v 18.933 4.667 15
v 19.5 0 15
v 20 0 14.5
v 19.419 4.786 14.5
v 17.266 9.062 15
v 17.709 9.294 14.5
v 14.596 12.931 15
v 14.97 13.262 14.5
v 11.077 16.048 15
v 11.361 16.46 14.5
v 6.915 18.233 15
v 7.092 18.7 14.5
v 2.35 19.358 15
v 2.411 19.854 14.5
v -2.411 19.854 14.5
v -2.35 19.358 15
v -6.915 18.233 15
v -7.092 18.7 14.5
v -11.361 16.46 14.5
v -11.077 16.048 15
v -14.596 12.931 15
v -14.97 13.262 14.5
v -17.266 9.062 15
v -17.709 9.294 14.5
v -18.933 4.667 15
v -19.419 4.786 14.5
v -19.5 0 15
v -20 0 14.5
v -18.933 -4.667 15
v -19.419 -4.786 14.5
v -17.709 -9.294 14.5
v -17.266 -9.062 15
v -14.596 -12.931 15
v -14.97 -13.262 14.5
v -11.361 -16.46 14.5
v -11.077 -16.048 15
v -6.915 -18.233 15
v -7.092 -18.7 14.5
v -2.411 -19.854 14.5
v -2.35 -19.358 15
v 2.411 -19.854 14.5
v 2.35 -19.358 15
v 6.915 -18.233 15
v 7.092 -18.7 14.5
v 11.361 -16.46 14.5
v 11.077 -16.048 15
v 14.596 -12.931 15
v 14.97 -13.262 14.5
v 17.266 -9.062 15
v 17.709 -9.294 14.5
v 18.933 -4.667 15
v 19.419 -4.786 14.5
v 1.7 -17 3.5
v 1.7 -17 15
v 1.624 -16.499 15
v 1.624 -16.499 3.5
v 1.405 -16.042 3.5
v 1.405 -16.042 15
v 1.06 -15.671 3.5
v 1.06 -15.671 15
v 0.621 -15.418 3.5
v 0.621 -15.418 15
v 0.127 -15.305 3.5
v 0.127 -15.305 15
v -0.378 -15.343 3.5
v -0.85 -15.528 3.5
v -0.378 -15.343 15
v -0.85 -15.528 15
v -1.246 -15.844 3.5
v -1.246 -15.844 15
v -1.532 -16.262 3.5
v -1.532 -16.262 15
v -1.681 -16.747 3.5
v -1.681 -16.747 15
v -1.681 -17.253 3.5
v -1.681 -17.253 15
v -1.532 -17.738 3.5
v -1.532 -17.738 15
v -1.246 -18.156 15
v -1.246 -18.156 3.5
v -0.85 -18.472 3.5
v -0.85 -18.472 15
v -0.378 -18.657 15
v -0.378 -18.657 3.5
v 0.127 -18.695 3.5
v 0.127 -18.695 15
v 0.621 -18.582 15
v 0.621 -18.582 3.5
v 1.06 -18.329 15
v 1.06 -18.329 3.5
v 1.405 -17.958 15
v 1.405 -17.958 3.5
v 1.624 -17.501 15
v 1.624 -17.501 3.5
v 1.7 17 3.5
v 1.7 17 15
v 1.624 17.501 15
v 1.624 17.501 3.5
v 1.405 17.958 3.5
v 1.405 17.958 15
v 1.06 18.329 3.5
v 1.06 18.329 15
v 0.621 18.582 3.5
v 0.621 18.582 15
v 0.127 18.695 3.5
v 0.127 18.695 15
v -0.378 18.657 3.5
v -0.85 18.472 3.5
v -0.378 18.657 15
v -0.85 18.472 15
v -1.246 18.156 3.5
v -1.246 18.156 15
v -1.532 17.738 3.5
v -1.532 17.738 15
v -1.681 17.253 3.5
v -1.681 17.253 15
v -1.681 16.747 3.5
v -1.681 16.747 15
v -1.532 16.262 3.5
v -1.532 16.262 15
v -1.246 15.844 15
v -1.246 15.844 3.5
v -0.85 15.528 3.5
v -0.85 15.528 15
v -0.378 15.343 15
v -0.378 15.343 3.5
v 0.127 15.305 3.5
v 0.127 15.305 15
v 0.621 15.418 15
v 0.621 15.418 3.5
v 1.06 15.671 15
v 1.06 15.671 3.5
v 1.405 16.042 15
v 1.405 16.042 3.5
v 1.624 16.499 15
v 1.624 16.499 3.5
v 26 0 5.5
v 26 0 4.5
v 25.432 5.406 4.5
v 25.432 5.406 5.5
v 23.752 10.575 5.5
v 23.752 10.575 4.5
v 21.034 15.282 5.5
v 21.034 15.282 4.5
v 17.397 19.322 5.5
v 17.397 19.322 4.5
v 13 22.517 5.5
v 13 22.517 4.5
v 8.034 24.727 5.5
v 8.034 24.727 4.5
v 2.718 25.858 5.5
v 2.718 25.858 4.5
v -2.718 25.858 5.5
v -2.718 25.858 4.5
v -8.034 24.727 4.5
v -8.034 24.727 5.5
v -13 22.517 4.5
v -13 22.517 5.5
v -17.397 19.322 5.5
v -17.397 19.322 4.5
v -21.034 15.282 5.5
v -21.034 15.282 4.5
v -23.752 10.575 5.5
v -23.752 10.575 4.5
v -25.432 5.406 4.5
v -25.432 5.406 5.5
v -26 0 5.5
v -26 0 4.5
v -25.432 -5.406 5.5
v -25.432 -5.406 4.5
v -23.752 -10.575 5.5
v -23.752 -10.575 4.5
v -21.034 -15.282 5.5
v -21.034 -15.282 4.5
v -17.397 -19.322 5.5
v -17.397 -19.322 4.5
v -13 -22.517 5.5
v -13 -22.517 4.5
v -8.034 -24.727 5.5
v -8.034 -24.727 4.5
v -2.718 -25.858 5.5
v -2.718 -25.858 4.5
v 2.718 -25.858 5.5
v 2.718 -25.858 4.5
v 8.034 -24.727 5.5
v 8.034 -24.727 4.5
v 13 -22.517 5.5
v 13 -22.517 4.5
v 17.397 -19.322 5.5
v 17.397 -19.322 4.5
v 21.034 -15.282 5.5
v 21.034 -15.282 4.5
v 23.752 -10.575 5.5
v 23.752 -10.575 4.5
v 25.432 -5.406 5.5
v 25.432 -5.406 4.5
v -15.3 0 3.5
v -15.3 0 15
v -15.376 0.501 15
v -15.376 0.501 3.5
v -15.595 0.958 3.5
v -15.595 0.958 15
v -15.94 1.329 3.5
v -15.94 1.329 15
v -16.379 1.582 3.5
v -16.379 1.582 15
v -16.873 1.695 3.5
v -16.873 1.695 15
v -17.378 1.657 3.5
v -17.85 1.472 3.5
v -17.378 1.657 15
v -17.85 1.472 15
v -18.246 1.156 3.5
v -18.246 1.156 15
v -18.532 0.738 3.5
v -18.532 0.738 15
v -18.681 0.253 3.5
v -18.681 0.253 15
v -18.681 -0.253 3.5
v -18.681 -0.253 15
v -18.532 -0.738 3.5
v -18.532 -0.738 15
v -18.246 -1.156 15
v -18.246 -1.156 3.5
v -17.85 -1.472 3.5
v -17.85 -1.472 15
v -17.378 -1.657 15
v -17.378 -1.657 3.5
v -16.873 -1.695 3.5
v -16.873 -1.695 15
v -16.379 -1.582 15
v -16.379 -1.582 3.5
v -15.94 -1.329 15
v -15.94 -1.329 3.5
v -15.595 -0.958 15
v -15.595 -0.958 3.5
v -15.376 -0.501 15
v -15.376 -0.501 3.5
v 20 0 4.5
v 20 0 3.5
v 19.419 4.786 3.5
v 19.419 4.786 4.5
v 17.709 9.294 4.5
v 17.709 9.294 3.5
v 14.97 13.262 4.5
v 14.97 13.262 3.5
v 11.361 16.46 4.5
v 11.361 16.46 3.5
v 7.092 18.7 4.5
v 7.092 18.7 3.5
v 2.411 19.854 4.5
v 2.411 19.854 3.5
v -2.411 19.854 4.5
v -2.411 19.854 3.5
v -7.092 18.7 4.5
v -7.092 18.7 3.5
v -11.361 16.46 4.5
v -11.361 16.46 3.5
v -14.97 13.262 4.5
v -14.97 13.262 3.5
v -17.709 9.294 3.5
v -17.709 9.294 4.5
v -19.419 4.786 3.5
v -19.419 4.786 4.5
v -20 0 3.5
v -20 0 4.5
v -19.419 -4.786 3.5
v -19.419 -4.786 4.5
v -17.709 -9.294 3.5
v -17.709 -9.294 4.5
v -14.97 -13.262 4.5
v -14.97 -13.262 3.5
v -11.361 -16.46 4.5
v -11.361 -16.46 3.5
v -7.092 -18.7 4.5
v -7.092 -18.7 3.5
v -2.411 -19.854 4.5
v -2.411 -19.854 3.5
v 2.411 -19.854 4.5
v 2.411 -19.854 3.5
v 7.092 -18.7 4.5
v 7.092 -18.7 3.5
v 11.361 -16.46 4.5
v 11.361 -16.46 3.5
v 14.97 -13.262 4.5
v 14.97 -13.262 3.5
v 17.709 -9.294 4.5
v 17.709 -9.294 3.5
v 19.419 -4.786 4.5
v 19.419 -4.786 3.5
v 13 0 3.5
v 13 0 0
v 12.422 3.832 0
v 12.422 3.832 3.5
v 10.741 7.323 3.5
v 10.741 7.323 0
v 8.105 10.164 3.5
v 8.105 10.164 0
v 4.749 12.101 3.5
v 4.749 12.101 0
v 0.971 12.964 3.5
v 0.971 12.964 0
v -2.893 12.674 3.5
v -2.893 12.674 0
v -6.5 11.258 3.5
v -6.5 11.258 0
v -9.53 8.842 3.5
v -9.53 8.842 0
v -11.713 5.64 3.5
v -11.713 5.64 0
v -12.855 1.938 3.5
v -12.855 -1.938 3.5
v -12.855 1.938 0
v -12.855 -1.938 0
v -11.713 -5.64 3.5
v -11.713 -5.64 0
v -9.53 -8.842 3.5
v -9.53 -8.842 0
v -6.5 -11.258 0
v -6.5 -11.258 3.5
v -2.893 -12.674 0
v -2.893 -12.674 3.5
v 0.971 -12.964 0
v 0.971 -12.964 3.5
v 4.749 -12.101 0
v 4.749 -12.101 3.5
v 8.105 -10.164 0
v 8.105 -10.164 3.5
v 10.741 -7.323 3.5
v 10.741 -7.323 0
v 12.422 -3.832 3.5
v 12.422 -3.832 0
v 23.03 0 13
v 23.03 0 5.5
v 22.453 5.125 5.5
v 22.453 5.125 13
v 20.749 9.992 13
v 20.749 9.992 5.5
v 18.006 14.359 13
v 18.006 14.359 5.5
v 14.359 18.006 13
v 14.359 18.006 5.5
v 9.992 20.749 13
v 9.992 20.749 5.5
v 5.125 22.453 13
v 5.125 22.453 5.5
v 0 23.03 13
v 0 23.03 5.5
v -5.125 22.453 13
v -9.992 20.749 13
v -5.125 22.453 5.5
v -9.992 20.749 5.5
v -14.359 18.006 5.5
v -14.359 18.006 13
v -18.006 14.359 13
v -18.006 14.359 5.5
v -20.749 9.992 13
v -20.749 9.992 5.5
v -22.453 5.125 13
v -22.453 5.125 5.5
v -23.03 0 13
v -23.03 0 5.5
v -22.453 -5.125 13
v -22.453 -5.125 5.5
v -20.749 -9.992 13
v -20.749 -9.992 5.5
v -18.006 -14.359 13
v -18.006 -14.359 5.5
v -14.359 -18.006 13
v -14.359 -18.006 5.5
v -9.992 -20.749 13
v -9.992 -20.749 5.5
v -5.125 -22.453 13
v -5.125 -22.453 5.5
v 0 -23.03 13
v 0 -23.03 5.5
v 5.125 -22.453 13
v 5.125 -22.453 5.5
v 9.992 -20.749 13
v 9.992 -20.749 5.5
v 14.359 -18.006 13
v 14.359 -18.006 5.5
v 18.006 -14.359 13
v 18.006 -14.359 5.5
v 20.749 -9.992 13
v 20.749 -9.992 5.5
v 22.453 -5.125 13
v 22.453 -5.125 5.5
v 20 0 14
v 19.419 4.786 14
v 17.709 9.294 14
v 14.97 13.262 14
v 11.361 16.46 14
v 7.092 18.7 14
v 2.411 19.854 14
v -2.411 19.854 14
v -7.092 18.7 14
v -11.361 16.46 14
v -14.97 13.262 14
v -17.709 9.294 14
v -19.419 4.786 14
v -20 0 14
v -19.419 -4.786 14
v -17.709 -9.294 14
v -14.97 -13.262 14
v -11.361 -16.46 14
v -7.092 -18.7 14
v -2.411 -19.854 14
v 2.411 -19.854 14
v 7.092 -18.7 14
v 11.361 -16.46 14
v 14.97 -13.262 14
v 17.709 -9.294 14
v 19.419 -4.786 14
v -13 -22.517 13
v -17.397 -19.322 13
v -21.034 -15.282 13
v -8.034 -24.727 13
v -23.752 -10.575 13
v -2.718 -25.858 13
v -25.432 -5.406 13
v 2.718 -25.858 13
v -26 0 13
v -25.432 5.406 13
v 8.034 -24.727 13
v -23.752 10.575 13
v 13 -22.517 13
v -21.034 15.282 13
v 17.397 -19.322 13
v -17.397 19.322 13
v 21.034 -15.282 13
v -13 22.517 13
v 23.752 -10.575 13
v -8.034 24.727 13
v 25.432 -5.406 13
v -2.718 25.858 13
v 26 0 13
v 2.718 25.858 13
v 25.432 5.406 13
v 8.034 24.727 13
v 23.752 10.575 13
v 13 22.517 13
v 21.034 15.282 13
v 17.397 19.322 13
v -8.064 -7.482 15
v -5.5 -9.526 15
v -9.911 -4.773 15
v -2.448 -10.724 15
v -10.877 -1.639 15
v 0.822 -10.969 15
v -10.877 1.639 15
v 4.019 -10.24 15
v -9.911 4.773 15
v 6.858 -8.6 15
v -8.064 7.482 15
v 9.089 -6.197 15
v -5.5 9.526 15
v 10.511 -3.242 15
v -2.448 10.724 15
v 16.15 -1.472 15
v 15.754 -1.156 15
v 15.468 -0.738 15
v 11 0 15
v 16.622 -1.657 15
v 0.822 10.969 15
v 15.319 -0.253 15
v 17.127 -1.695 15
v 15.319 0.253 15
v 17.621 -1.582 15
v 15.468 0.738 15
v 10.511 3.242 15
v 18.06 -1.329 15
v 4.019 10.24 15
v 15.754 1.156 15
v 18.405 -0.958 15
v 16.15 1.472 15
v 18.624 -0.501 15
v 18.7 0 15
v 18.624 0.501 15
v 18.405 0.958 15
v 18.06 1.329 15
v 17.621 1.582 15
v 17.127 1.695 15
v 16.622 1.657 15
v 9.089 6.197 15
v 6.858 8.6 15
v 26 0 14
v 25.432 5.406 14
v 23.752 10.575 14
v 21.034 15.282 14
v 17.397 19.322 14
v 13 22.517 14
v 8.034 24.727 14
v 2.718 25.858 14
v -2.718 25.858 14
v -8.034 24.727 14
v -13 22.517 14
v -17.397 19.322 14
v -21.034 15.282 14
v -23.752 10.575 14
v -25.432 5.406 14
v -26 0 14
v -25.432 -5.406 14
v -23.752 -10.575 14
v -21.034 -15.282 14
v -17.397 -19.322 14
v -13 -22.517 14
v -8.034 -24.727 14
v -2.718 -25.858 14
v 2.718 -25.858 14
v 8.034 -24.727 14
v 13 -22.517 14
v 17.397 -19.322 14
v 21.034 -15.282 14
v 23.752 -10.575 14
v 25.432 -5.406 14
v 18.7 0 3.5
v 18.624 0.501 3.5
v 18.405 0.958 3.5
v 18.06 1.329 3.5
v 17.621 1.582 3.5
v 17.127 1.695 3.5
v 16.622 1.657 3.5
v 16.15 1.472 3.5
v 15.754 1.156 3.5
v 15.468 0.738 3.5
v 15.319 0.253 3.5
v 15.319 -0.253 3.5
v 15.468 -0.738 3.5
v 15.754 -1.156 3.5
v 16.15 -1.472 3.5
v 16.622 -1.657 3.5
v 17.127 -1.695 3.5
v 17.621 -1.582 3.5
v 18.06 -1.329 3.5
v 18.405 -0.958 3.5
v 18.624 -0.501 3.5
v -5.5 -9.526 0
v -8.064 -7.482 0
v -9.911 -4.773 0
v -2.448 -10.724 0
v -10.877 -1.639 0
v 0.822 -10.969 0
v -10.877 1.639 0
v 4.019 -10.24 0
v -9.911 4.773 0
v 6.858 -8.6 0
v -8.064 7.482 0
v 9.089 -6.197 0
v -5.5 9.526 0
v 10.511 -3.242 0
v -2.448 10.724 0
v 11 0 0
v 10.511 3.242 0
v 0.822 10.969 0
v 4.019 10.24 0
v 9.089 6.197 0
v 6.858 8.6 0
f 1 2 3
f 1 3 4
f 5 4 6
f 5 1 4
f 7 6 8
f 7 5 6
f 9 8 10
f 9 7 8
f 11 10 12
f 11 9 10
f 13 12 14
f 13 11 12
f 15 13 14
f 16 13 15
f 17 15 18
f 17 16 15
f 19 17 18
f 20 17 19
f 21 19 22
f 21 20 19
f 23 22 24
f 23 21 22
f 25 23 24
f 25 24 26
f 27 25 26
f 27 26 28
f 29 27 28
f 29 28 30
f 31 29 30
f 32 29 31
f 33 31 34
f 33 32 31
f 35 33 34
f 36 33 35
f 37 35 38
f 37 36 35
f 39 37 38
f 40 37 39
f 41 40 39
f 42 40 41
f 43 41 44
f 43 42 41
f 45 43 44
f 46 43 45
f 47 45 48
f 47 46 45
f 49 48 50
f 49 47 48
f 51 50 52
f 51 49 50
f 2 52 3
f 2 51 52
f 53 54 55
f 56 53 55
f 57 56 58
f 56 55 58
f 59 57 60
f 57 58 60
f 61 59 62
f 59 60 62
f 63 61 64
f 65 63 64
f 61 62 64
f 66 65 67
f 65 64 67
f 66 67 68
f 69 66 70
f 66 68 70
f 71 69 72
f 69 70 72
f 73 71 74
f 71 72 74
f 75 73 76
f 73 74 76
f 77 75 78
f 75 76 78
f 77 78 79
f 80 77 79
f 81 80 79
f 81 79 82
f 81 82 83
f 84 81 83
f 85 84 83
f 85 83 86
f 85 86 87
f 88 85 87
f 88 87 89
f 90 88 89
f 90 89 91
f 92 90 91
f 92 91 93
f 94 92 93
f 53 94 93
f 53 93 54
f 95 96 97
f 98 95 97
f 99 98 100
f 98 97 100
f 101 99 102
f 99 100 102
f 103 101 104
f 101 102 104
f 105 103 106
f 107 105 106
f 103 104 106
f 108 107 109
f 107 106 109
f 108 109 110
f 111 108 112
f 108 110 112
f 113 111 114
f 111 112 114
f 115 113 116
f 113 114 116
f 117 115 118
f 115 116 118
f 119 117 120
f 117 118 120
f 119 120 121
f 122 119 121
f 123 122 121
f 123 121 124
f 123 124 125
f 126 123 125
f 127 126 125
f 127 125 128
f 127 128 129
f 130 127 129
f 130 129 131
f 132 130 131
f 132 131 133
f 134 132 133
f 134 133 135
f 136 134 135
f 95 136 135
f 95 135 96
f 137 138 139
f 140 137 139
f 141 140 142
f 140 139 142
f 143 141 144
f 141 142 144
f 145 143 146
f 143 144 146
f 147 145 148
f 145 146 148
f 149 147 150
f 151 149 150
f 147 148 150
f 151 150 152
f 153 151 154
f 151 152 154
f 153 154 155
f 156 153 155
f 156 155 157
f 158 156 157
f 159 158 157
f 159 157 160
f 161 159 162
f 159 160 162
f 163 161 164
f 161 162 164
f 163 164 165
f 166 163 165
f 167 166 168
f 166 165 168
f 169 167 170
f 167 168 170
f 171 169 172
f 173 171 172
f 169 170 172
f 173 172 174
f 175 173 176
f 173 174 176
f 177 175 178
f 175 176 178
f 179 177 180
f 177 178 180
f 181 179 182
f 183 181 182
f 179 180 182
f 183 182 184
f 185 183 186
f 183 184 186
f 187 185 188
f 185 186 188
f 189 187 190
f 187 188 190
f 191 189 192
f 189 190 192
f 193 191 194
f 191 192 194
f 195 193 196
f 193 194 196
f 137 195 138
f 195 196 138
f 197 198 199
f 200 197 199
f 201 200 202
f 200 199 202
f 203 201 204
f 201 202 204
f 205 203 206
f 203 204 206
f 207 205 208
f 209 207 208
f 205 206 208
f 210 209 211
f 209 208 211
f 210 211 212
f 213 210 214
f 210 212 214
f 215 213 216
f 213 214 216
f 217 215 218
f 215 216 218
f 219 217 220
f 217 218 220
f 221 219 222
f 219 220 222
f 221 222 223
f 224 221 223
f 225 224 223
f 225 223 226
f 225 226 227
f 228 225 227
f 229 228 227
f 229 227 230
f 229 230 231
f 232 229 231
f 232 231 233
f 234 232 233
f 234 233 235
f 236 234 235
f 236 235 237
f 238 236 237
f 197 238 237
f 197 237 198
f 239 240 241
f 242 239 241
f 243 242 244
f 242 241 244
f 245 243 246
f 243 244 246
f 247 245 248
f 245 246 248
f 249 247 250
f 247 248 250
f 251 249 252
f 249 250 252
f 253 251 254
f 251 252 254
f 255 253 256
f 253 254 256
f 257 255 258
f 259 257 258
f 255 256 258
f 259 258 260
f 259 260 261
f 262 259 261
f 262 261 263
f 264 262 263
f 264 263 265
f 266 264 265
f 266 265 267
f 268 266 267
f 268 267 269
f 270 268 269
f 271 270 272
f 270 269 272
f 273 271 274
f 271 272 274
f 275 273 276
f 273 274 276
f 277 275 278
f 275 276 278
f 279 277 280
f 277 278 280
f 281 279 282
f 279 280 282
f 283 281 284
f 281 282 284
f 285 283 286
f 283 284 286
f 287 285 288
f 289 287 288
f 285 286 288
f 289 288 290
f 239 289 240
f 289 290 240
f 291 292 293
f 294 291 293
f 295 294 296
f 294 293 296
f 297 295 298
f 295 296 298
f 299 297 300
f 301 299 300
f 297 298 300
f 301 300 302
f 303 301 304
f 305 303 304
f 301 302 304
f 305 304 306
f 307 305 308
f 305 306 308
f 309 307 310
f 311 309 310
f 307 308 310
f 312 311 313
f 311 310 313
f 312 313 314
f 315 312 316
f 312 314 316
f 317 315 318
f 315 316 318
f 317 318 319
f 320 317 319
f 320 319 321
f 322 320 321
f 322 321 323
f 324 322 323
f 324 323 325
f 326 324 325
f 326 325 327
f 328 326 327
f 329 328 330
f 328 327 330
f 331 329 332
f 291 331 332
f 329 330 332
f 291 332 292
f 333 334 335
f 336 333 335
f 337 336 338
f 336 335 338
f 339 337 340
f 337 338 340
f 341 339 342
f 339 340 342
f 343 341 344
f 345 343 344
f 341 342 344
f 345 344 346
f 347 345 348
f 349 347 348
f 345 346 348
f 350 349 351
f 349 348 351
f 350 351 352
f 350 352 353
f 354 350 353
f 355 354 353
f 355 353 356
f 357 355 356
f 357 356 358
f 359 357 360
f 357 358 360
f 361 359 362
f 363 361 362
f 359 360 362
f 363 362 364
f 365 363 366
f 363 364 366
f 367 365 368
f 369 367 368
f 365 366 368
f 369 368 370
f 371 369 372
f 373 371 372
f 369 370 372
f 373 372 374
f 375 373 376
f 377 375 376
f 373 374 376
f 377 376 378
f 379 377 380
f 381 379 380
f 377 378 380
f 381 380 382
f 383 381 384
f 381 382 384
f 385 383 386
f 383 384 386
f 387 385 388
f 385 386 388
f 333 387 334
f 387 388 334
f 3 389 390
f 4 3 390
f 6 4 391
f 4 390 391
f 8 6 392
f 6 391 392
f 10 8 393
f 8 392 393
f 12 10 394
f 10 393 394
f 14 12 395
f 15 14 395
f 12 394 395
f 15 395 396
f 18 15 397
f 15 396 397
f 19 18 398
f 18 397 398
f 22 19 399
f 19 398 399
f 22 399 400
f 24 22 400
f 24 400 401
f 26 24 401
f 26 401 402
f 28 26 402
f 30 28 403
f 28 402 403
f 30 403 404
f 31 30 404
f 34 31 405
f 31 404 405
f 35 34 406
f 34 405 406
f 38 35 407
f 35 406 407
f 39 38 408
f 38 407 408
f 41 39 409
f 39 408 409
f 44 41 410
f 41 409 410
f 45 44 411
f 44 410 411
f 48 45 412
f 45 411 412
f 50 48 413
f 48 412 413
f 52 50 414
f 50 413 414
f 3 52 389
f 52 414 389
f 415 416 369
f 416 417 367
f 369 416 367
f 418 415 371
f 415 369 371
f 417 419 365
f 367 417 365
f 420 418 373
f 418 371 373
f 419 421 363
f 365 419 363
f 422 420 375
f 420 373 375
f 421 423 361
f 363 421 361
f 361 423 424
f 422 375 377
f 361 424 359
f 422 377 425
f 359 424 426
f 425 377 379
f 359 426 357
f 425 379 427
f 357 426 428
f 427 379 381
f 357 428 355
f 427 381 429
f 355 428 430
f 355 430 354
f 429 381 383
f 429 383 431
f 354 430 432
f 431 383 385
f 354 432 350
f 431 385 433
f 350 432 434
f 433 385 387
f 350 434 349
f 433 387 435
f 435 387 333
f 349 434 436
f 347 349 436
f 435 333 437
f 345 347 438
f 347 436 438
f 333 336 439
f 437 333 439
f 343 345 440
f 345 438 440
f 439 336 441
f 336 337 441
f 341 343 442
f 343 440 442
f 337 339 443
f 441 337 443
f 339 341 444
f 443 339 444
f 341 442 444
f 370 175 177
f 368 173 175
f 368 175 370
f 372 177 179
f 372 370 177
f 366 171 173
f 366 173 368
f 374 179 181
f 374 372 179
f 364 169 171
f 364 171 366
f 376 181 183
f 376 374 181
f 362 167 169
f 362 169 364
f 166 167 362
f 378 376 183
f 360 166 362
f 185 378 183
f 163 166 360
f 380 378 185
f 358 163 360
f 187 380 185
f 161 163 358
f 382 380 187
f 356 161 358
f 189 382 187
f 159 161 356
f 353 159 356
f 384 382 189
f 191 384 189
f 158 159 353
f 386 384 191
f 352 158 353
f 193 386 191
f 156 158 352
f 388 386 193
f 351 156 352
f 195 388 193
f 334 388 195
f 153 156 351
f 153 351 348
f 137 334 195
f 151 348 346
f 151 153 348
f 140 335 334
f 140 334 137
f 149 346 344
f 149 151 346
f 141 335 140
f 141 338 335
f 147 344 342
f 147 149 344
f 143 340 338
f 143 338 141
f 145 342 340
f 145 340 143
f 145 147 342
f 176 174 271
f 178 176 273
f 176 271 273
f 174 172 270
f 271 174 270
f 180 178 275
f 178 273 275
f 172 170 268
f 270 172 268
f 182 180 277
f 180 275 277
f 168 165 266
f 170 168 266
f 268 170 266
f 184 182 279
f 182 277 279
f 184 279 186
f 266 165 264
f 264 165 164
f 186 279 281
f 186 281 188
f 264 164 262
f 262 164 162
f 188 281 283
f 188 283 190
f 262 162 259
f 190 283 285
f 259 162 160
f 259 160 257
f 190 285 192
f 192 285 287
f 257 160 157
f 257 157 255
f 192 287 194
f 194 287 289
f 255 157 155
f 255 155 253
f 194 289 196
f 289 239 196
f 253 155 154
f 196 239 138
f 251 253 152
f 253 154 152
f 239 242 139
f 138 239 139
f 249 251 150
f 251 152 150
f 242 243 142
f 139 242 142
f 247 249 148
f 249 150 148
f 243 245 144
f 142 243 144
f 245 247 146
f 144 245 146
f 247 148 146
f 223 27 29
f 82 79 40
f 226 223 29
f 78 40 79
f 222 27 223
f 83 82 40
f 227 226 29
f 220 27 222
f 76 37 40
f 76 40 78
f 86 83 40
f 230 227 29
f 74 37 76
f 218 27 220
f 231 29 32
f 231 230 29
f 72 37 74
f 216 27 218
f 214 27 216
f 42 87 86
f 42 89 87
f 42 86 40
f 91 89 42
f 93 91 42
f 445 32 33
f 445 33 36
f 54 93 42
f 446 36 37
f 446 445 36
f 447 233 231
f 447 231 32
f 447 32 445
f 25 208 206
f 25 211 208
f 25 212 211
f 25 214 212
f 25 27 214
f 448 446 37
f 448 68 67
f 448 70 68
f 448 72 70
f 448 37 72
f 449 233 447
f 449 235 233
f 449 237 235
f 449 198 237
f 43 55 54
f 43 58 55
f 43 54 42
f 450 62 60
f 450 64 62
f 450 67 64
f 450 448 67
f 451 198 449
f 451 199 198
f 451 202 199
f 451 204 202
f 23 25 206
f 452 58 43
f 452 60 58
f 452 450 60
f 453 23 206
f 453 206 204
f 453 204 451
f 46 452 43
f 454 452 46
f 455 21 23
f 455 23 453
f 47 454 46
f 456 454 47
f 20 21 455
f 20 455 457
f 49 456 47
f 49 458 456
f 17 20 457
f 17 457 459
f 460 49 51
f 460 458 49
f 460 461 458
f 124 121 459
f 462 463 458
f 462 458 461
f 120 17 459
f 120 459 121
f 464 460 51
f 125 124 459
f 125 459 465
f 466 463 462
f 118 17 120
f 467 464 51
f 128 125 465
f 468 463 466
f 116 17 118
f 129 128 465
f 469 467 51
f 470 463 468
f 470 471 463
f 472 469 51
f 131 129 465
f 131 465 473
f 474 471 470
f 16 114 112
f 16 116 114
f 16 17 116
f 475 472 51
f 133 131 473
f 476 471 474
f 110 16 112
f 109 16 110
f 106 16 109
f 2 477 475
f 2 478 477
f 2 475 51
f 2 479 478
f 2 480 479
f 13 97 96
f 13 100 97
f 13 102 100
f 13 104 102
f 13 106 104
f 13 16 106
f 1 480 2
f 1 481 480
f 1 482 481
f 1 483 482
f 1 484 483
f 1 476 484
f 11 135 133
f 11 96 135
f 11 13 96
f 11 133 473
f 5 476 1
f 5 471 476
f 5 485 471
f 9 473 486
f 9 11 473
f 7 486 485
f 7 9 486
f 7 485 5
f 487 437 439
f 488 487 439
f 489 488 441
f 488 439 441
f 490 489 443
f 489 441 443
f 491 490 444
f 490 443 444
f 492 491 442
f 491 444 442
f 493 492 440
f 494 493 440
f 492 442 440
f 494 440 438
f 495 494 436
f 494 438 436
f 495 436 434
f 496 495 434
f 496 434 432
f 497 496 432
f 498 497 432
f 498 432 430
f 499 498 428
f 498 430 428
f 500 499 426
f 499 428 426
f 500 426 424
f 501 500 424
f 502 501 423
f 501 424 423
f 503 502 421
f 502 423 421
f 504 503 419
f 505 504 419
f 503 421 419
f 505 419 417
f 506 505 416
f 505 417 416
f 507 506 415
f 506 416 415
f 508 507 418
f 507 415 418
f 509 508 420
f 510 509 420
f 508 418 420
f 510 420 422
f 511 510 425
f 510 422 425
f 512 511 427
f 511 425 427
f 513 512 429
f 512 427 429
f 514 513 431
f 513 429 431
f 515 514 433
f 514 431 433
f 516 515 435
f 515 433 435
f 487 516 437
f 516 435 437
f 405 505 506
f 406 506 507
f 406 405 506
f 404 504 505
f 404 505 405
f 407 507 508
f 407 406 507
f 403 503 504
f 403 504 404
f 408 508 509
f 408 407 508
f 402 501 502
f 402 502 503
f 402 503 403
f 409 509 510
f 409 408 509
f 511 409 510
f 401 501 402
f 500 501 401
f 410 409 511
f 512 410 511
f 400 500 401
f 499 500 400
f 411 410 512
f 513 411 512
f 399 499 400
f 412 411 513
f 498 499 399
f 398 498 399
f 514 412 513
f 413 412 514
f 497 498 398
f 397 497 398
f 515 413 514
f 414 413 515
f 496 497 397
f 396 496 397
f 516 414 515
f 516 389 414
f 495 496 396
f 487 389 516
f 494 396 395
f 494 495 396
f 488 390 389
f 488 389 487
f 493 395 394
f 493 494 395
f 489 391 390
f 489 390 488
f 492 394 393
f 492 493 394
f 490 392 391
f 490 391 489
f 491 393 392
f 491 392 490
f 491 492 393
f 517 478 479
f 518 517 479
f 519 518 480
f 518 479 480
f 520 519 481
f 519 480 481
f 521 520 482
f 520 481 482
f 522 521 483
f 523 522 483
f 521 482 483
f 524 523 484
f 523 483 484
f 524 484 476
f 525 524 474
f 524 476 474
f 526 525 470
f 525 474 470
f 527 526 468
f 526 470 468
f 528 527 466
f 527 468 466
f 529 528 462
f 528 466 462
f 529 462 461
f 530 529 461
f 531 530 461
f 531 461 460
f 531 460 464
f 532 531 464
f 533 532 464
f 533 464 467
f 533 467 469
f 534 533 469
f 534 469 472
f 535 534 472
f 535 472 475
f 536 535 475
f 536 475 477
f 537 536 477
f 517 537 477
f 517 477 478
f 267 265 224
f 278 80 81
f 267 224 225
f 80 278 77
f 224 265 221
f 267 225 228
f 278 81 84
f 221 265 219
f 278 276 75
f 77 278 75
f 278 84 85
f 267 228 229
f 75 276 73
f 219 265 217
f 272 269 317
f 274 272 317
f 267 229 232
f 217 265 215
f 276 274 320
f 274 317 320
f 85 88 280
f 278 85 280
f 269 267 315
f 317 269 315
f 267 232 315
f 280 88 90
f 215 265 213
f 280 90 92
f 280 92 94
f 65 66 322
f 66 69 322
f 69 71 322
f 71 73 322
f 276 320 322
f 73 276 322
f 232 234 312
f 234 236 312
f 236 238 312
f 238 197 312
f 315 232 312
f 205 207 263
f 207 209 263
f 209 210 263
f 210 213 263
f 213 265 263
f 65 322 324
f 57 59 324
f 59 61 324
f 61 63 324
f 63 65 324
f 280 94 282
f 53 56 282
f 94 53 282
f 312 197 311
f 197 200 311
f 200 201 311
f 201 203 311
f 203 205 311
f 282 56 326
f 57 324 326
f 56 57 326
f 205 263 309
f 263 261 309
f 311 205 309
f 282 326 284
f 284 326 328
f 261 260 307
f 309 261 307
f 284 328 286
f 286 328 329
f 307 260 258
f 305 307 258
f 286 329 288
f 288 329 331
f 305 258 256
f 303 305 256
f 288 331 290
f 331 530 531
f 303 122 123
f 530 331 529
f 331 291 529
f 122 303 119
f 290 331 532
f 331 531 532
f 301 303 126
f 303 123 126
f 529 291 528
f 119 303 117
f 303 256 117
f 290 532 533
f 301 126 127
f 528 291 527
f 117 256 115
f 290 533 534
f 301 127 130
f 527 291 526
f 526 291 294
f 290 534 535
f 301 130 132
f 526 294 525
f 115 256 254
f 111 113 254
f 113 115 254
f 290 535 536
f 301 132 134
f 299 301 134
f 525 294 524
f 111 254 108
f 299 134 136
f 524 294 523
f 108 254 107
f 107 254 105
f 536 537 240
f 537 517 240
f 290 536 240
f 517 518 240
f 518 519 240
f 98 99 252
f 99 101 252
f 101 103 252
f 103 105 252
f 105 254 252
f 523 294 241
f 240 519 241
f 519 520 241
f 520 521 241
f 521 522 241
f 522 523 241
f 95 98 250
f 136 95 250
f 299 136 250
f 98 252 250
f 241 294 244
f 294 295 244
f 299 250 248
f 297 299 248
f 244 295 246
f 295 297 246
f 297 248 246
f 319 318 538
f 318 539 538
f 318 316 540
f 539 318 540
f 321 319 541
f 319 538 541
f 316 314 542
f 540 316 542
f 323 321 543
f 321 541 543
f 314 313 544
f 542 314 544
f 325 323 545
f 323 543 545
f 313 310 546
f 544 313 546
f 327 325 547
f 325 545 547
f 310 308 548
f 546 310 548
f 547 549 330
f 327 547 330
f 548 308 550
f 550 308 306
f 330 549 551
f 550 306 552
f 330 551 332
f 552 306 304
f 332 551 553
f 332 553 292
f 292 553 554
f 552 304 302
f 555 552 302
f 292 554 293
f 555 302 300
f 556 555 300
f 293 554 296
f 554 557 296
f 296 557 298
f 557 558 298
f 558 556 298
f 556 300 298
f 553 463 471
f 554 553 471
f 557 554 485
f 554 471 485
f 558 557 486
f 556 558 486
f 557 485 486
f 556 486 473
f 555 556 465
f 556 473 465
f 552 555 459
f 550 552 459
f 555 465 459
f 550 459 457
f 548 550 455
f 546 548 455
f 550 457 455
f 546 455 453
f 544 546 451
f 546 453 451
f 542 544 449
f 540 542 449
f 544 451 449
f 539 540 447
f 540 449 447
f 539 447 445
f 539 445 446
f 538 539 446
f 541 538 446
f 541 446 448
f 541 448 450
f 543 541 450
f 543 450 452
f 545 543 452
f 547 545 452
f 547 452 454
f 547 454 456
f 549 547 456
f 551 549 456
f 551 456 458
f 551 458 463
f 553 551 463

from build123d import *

# Parameters (mm, degrees)
SKETCH1_R                   = 13
BOSS_EXTRUDE1_DEPTH         = 3.5
SKETCH2_R                   = 20
BOSS_EXTRUDE2_DEPTH         = 1
SKETCH3_R                   = 26
BOSS_EXTRUDE3_DEPTH         = 1
SKETCH4_R                   = 23.03
BOSS_EXTRUDE4_DEPTH         = 7.5
SKETCH5_R                   = 26
BOSS_EXTRUDE5_DEPTH         = 1
SKETCH6_R                   = 20
BOSS_EXTRUDE6_DEPTH         = 1
SKETCH7_R                   = 11
CUT_EXTRUDE1_DEPTH          = 40.711459303
TAP_DRILL_FOR_M3X0_5_TAP1_D = 3.4
CHAMFER1_SIZE               = 0.5


with BuildPart() as part:
    # Sketch1 → Boss-Extrude1 (new body)
    with BuildSketch(Plane.XY):
        Circle(SKETCH1_R)
    extrude(amount=BOSS_EXTRUDE1_DEPTH)

    # Sketch2 → Boss-Extrude2 (add)
    with BuildSketch(Plane.XY.offset(3.5)):
        Circle(SKETCH2_R)
    extrude(amount=BOSS_EXTRUDE2_DEPTH)

    # Sketch3 → Boss-Extrude3 (add)
    with BuildSketch(Plane.XY.offset(4.5)):
        Circle(SKETCH3_R)
    extrude(amount=BOSS_EXTRUDE3_DEPTH)

    # Sketch4 → Boss-Extrude4 (add)
    with BuildSketch(Plane.XY.offset(5.5)):
        Circle(SKETCH4_R)
    extrude(amount=BOSS_EXTRUDE4_DEPTH)

    # Sketch5 → Boss-Extrude5 (add)
    with BuildSketch(Plane.XY.offset(13)):
        Circle(SKETCH5_R)
    extrude(amount=BOSS_EXTRUDE5_DEPTH)

    # Sketch6 → Boss-Extrude6 (add)
    with BuildSketch(Plane.XY.offset(14)):
        Circle(SKETCH6_R)
    extrude(amount=BOSS_EXTRUDE6_DEPTH)

    # Sketch7 → Cut-Extrude1 (cut, through all)
    with BuildSketch(Plane.XY.offset(15)):
        Circle(SKETCH7_R)
    extrude(amount=-CUT_EXTRUDE1_DEPTH, mode=Mode.SUBTRACT)

    # Tap Drill for M3x0.5 Tap1 (through all)
    with Locations(Plane(origin=(0, 0, 3.5), x_dir=(-1, 0, 0), z_dir=(0, 0, -1))):
        with Locations((0, 17), (17, 0), (0, -17), (-17, 0)):
            Hole(TAP_DRILL_FOR_M3X0_5_TAP1_D / 2)

    # Chamfer1
    chamfer1_edges = [part.edges().sort_by_distance(p)[0] for p in [
        (-20, 0, 15),
    ]]
    chamfer(chamfer1_edges, length=CHAMFER1_SIZE)


solid = part.part
